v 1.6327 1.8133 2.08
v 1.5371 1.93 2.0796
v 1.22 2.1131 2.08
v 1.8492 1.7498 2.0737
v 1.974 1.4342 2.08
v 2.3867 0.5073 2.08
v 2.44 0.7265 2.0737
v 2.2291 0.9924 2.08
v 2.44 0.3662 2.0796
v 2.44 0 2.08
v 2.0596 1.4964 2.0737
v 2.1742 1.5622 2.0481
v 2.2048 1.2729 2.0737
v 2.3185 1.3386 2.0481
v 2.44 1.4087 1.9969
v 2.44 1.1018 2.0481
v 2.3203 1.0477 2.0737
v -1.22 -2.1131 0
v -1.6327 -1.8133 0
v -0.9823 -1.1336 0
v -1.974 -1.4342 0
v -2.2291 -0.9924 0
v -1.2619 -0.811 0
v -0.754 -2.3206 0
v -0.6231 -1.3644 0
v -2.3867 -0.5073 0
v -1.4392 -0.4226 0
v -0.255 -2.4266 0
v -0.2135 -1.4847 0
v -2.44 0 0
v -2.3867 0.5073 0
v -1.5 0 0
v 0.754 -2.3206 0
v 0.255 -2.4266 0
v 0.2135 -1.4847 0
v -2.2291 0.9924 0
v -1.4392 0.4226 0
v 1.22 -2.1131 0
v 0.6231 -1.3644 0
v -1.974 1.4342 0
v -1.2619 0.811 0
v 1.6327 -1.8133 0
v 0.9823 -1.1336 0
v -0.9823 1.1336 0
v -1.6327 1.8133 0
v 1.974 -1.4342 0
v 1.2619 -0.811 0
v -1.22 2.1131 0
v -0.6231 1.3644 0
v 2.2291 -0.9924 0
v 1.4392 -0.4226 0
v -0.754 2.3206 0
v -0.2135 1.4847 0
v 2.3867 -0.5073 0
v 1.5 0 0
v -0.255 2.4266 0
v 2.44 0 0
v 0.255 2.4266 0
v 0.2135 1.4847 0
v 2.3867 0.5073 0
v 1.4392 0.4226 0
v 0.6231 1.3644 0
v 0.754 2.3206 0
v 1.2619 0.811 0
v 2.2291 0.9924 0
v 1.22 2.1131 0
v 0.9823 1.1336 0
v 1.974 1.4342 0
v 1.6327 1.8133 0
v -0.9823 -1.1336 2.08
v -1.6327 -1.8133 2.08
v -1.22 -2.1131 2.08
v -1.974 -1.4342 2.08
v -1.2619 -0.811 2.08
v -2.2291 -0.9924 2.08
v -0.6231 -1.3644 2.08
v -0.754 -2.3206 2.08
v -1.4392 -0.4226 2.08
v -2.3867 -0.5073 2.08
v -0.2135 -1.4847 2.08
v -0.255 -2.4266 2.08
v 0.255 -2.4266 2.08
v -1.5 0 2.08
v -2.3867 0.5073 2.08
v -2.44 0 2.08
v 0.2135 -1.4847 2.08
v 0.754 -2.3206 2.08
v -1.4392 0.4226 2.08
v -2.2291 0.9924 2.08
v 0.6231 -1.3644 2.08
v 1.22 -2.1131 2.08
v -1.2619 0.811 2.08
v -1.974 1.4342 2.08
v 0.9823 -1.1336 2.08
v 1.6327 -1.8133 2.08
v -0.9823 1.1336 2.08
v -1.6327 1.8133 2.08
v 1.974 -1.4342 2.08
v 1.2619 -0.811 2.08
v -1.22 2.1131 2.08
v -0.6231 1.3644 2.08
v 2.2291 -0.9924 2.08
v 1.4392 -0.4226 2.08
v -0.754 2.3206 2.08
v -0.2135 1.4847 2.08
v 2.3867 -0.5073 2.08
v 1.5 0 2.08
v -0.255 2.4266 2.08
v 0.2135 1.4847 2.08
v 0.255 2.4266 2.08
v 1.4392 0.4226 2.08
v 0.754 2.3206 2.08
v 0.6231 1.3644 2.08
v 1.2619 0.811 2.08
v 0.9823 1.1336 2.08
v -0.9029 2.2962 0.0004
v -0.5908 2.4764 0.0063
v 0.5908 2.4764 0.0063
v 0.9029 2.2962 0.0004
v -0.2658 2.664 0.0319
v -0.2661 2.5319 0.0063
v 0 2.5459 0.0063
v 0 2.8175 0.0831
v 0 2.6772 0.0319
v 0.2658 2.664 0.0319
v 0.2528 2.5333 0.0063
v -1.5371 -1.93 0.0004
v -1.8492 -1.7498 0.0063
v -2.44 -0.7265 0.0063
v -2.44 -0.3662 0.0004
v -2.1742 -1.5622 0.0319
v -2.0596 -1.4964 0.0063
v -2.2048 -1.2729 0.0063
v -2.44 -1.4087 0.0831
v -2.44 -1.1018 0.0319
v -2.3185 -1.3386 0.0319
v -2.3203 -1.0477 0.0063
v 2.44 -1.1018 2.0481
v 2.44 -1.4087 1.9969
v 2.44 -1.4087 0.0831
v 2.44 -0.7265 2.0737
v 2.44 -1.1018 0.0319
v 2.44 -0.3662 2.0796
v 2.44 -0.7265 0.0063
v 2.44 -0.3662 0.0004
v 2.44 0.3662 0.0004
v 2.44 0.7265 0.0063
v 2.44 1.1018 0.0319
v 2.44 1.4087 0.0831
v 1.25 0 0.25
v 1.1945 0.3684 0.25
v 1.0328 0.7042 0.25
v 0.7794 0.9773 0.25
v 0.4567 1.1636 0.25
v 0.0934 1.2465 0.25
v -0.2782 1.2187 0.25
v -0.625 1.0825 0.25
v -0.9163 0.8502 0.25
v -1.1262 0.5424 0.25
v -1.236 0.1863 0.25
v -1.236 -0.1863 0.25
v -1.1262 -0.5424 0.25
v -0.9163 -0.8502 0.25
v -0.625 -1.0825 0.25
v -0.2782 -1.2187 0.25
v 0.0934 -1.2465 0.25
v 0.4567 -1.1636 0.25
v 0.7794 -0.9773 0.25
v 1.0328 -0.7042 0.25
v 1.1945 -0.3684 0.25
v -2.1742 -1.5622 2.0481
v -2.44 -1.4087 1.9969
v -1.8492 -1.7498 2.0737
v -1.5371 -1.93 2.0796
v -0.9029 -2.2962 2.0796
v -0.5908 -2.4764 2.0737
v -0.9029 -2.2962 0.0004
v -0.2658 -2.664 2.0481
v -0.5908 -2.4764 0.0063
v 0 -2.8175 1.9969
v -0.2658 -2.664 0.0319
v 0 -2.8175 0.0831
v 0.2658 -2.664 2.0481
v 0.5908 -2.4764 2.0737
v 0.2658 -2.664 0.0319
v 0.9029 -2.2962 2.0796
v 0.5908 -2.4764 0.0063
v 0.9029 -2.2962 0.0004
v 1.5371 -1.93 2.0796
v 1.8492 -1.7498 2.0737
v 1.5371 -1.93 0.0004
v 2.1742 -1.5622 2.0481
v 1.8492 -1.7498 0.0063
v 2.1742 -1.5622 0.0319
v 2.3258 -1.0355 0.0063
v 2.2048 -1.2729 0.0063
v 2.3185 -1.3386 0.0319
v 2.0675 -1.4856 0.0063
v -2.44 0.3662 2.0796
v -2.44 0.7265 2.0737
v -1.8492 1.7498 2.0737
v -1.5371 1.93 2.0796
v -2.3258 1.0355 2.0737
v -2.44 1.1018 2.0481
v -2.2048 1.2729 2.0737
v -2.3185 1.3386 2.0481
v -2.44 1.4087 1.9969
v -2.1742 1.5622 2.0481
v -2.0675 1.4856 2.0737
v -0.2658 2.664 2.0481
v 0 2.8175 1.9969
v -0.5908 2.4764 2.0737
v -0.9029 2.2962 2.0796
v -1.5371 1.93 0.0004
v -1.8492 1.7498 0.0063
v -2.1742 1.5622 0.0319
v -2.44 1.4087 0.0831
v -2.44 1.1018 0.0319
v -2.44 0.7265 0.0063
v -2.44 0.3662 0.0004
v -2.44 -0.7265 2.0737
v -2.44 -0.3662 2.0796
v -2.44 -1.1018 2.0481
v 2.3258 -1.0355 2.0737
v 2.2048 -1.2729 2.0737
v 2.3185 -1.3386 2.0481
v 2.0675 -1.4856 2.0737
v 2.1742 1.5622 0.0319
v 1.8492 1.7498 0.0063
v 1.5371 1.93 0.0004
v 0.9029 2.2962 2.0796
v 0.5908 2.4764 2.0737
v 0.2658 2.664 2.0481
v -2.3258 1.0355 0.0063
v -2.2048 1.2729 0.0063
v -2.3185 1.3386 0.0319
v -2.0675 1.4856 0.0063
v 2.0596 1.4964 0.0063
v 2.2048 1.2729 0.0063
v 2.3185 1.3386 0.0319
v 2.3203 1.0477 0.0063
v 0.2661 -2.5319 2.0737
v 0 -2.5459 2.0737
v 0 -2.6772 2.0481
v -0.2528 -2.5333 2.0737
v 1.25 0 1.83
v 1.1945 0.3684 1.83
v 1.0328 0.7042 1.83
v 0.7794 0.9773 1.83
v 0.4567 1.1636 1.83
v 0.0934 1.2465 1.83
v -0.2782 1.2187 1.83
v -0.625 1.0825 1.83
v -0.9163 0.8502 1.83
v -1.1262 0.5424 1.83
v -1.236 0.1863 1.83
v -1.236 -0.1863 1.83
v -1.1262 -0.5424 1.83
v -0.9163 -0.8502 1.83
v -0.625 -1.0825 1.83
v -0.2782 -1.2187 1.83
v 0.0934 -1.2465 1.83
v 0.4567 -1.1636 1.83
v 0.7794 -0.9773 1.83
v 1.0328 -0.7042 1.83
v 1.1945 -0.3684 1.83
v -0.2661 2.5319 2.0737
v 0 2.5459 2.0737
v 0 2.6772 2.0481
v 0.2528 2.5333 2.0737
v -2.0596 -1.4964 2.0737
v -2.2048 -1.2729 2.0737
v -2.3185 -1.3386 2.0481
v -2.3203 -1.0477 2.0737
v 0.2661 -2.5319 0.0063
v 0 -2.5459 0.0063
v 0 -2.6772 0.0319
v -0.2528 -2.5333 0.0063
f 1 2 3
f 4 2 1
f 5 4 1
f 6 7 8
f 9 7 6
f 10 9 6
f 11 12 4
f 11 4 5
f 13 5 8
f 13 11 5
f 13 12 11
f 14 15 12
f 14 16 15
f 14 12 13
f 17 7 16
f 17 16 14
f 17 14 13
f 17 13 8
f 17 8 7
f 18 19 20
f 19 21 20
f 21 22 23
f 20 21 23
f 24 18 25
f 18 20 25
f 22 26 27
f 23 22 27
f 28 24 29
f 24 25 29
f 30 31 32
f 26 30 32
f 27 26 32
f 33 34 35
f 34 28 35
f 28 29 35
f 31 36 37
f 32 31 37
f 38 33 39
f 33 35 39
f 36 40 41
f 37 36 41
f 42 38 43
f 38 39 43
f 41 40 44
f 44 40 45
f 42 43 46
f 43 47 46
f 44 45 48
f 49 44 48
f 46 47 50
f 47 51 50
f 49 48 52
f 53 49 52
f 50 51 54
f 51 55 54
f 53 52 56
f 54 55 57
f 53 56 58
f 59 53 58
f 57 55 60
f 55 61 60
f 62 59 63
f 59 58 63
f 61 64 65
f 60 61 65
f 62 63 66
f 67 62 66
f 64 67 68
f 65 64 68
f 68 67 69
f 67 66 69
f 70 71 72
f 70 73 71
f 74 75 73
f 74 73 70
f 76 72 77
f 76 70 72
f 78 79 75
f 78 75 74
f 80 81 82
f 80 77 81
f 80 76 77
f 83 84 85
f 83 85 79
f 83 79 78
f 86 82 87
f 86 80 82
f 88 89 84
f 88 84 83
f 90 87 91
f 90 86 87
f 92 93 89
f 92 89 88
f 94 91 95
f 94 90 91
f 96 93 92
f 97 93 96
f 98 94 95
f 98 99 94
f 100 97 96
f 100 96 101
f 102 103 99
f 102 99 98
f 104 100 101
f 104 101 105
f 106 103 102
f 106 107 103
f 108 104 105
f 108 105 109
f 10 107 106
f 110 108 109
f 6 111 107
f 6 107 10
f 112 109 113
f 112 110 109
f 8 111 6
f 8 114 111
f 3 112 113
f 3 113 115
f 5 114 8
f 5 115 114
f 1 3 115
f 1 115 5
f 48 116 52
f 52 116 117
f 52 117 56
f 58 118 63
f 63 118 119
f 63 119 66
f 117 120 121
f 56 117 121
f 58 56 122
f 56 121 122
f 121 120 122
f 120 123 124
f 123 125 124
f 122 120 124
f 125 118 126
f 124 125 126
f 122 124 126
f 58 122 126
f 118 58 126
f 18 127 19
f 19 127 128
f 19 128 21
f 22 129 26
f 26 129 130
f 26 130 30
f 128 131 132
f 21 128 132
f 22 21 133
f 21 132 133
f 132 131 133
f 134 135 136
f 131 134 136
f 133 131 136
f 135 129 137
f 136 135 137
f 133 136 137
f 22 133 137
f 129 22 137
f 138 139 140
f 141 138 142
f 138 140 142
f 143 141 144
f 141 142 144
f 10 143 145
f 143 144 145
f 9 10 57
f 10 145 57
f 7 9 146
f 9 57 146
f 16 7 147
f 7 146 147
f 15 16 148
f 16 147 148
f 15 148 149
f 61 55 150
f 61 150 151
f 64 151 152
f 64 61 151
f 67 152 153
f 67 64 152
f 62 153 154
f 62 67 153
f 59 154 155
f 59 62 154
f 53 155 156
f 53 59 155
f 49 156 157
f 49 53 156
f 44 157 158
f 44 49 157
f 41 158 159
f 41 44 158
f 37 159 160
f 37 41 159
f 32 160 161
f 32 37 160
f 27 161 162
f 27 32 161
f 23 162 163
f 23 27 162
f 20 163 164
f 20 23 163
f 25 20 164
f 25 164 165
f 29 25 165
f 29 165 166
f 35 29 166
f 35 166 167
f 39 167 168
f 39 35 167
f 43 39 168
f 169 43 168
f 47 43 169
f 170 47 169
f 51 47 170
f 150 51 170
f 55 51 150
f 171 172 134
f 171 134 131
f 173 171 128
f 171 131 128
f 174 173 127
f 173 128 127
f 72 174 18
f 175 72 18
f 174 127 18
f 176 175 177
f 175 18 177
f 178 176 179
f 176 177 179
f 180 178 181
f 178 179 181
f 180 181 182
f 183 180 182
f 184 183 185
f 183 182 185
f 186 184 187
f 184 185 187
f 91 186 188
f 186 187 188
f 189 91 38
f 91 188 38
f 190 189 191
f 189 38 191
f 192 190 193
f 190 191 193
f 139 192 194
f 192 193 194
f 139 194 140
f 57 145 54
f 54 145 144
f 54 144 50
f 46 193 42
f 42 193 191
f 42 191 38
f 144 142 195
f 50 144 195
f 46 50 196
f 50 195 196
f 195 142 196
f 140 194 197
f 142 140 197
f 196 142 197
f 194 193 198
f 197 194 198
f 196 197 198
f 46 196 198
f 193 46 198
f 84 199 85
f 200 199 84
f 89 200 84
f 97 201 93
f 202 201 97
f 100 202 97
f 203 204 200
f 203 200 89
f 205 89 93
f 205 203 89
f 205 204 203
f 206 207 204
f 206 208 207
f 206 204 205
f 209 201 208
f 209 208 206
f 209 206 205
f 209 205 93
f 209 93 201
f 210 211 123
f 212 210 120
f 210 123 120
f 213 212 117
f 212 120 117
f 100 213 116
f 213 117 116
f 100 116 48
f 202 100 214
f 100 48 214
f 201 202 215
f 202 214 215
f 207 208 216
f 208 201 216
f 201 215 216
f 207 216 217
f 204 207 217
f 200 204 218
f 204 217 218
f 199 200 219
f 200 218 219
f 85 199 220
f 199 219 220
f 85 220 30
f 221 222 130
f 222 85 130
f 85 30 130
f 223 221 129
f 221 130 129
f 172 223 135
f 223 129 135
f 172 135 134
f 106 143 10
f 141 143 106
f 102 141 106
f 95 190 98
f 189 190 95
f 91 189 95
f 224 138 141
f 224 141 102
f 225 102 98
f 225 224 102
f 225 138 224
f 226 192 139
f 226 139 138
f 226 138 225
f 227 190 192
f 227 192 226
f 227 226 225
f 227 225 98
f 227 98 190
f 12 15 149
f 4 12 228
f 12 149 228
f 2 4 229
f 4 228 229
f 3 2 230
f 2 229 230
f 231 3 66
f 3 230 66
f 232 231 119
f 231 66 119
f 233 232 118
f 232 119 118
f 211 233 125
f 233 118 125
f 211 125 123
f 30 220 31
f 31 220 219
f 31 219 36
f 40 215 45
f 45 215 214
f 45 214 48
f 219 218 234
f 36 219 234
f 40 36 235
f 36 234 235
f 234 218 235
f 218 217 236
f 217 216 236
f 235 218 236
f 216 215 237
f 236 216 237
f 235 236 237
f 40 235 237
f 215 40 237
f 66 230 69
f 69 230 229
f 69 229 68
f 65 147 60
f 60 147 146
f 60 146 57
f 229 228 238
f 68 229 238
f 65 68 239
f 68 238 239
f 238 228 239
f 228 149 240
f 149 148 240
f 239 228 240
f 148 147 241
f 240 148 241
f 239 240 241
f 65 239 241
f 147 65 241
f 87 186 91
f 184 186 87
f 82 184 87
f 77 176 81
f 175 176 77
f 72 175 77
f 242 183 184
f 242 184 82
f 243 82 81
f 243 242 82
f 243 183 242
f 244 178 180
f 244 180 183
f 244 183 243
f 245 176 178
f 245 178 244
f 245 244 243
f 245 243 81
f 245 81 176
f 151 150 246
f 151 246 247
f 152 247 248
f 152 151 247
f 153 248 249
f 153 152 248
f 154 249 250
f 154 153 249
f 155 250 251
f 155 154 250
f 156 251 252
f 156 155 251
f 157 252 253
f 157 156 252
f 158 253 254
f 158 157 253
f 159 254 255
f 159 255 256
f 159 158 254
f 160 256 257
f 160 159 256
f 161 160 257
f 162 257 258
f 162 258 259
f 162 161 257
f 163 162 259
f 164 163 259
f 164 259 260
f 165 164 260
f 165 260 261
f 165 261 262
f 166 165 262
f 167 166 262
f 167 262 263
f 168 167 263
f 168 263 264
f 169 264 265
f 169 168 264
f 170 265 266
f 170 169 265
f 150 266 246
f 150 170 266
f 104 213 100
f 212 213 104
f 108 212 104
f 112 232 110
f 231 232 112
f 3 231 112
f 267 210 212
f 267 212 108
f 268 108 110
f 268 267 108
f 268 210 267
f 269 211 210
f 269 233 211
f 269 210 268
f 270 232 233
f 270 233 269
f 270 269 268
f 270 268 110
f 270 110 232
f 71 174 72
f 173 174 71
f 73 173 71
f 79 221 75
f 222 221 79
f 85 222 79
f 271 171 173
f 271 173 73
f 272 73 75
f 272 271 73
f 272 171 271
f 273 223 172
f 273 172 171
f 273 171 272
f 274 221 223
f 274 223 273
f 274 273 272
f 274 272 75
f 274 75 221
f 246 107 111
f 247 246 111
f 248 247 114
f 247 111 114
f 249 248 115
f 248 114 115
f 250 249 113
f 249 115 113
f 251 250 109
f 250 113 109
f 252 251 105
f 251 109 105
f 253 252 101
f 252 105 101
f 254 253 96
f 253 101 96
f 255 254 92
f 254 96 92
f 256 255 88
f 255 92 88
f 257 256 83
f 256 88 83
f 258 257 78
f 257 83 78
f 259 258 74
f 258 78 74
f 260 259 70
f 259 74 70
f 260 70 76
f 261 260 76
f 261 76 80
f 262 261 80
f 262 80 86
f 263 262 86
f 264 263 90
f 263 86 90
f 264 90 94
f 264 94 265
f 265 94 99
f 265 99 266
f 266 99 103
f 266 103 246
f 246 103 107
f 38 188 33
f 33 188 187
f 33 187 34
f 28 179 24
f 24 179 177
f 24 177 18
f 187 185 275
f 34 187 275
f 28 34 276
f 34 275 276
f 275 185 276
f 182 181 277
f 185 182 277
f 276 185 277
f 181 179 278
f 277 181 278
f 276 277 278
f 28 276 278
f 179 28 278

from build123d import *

# Parameters (mm, degrees)
SKETCH1_R           = 1.25
BOSS_EXTRUDE1_DEPTH = 2.08
CHAMFER1_SIZE       = 0.25


with BuildPart() as part:
    # Sketch1 → Boss-Extrude1 (new body)
    with BuildSketch(Plane.XY):
        Polygon((2.44, 1.408734657), (0, 2.817469314), (-2.44, 1.408734657), (-2.44, -1.408734657), (0, -2.817469314), (2.44, -1.408734657), align=None)
        Circle(SKETCH1_R, mode=Mode.SUBTRACT)
    extrude(amount=BOSS_EXTRUDE1_DEPTH)

    # Chamfer1
    chamfer1_edges = [part.edges().sort_by_distance(p)[0] for p in [
        (-1.25, 0, 0),
        (-1.25, 0, 2.08),
    ]]
    chamfer(chamfer1_edges, length=CHAMFER1_SIZE)

    # Sketch2 → Cut-Revolve1 (revolve, cut)
    with BuildSketch(Plane(origin=(0, 0, 0), x_dir=(1, 0, 0), z_dir=(0, 1, 0))):
        with BuildLine():
            Line((-3.307835601, -0.663581472), (-4.500819954, -0.663581472))
            Line((-4.500819954, -0.663581472), (-4.500819954, 0.361239255))
            Line((-4.500819954, 0.361239255), (-2.44, 0.361239255))
            Line((-2.44, 0.361239255), (-2.44, 0))
            ThreePointArc((-2.44, 0), (-2.986232322, -0.184905169), (-3.307835601, -0.663581472))
        make_face()
        with BuildLine():
            Line((-2.44, -2.441239255), (-2.44, -2.08))
            ThreePointArc((-2.44, -2.08), (-2.986232322, -1.895094831), (-3.307835601, -1.416418528))
            Line((-3.307835601, -1.416418528), (-4.500819954, -1.416418528))
            Line((-4.500819954, -1.416418528), (-4.500819954, -2.441239255))
            Line((-4.500819954, -2.441239255), (-2.44, -2.441239255))
        make_face()
    revolve(axis=Axis((0, 0, 1.04), (0, 0, -1)), mode=Mode.SUBTRACT)


solid = part.part
